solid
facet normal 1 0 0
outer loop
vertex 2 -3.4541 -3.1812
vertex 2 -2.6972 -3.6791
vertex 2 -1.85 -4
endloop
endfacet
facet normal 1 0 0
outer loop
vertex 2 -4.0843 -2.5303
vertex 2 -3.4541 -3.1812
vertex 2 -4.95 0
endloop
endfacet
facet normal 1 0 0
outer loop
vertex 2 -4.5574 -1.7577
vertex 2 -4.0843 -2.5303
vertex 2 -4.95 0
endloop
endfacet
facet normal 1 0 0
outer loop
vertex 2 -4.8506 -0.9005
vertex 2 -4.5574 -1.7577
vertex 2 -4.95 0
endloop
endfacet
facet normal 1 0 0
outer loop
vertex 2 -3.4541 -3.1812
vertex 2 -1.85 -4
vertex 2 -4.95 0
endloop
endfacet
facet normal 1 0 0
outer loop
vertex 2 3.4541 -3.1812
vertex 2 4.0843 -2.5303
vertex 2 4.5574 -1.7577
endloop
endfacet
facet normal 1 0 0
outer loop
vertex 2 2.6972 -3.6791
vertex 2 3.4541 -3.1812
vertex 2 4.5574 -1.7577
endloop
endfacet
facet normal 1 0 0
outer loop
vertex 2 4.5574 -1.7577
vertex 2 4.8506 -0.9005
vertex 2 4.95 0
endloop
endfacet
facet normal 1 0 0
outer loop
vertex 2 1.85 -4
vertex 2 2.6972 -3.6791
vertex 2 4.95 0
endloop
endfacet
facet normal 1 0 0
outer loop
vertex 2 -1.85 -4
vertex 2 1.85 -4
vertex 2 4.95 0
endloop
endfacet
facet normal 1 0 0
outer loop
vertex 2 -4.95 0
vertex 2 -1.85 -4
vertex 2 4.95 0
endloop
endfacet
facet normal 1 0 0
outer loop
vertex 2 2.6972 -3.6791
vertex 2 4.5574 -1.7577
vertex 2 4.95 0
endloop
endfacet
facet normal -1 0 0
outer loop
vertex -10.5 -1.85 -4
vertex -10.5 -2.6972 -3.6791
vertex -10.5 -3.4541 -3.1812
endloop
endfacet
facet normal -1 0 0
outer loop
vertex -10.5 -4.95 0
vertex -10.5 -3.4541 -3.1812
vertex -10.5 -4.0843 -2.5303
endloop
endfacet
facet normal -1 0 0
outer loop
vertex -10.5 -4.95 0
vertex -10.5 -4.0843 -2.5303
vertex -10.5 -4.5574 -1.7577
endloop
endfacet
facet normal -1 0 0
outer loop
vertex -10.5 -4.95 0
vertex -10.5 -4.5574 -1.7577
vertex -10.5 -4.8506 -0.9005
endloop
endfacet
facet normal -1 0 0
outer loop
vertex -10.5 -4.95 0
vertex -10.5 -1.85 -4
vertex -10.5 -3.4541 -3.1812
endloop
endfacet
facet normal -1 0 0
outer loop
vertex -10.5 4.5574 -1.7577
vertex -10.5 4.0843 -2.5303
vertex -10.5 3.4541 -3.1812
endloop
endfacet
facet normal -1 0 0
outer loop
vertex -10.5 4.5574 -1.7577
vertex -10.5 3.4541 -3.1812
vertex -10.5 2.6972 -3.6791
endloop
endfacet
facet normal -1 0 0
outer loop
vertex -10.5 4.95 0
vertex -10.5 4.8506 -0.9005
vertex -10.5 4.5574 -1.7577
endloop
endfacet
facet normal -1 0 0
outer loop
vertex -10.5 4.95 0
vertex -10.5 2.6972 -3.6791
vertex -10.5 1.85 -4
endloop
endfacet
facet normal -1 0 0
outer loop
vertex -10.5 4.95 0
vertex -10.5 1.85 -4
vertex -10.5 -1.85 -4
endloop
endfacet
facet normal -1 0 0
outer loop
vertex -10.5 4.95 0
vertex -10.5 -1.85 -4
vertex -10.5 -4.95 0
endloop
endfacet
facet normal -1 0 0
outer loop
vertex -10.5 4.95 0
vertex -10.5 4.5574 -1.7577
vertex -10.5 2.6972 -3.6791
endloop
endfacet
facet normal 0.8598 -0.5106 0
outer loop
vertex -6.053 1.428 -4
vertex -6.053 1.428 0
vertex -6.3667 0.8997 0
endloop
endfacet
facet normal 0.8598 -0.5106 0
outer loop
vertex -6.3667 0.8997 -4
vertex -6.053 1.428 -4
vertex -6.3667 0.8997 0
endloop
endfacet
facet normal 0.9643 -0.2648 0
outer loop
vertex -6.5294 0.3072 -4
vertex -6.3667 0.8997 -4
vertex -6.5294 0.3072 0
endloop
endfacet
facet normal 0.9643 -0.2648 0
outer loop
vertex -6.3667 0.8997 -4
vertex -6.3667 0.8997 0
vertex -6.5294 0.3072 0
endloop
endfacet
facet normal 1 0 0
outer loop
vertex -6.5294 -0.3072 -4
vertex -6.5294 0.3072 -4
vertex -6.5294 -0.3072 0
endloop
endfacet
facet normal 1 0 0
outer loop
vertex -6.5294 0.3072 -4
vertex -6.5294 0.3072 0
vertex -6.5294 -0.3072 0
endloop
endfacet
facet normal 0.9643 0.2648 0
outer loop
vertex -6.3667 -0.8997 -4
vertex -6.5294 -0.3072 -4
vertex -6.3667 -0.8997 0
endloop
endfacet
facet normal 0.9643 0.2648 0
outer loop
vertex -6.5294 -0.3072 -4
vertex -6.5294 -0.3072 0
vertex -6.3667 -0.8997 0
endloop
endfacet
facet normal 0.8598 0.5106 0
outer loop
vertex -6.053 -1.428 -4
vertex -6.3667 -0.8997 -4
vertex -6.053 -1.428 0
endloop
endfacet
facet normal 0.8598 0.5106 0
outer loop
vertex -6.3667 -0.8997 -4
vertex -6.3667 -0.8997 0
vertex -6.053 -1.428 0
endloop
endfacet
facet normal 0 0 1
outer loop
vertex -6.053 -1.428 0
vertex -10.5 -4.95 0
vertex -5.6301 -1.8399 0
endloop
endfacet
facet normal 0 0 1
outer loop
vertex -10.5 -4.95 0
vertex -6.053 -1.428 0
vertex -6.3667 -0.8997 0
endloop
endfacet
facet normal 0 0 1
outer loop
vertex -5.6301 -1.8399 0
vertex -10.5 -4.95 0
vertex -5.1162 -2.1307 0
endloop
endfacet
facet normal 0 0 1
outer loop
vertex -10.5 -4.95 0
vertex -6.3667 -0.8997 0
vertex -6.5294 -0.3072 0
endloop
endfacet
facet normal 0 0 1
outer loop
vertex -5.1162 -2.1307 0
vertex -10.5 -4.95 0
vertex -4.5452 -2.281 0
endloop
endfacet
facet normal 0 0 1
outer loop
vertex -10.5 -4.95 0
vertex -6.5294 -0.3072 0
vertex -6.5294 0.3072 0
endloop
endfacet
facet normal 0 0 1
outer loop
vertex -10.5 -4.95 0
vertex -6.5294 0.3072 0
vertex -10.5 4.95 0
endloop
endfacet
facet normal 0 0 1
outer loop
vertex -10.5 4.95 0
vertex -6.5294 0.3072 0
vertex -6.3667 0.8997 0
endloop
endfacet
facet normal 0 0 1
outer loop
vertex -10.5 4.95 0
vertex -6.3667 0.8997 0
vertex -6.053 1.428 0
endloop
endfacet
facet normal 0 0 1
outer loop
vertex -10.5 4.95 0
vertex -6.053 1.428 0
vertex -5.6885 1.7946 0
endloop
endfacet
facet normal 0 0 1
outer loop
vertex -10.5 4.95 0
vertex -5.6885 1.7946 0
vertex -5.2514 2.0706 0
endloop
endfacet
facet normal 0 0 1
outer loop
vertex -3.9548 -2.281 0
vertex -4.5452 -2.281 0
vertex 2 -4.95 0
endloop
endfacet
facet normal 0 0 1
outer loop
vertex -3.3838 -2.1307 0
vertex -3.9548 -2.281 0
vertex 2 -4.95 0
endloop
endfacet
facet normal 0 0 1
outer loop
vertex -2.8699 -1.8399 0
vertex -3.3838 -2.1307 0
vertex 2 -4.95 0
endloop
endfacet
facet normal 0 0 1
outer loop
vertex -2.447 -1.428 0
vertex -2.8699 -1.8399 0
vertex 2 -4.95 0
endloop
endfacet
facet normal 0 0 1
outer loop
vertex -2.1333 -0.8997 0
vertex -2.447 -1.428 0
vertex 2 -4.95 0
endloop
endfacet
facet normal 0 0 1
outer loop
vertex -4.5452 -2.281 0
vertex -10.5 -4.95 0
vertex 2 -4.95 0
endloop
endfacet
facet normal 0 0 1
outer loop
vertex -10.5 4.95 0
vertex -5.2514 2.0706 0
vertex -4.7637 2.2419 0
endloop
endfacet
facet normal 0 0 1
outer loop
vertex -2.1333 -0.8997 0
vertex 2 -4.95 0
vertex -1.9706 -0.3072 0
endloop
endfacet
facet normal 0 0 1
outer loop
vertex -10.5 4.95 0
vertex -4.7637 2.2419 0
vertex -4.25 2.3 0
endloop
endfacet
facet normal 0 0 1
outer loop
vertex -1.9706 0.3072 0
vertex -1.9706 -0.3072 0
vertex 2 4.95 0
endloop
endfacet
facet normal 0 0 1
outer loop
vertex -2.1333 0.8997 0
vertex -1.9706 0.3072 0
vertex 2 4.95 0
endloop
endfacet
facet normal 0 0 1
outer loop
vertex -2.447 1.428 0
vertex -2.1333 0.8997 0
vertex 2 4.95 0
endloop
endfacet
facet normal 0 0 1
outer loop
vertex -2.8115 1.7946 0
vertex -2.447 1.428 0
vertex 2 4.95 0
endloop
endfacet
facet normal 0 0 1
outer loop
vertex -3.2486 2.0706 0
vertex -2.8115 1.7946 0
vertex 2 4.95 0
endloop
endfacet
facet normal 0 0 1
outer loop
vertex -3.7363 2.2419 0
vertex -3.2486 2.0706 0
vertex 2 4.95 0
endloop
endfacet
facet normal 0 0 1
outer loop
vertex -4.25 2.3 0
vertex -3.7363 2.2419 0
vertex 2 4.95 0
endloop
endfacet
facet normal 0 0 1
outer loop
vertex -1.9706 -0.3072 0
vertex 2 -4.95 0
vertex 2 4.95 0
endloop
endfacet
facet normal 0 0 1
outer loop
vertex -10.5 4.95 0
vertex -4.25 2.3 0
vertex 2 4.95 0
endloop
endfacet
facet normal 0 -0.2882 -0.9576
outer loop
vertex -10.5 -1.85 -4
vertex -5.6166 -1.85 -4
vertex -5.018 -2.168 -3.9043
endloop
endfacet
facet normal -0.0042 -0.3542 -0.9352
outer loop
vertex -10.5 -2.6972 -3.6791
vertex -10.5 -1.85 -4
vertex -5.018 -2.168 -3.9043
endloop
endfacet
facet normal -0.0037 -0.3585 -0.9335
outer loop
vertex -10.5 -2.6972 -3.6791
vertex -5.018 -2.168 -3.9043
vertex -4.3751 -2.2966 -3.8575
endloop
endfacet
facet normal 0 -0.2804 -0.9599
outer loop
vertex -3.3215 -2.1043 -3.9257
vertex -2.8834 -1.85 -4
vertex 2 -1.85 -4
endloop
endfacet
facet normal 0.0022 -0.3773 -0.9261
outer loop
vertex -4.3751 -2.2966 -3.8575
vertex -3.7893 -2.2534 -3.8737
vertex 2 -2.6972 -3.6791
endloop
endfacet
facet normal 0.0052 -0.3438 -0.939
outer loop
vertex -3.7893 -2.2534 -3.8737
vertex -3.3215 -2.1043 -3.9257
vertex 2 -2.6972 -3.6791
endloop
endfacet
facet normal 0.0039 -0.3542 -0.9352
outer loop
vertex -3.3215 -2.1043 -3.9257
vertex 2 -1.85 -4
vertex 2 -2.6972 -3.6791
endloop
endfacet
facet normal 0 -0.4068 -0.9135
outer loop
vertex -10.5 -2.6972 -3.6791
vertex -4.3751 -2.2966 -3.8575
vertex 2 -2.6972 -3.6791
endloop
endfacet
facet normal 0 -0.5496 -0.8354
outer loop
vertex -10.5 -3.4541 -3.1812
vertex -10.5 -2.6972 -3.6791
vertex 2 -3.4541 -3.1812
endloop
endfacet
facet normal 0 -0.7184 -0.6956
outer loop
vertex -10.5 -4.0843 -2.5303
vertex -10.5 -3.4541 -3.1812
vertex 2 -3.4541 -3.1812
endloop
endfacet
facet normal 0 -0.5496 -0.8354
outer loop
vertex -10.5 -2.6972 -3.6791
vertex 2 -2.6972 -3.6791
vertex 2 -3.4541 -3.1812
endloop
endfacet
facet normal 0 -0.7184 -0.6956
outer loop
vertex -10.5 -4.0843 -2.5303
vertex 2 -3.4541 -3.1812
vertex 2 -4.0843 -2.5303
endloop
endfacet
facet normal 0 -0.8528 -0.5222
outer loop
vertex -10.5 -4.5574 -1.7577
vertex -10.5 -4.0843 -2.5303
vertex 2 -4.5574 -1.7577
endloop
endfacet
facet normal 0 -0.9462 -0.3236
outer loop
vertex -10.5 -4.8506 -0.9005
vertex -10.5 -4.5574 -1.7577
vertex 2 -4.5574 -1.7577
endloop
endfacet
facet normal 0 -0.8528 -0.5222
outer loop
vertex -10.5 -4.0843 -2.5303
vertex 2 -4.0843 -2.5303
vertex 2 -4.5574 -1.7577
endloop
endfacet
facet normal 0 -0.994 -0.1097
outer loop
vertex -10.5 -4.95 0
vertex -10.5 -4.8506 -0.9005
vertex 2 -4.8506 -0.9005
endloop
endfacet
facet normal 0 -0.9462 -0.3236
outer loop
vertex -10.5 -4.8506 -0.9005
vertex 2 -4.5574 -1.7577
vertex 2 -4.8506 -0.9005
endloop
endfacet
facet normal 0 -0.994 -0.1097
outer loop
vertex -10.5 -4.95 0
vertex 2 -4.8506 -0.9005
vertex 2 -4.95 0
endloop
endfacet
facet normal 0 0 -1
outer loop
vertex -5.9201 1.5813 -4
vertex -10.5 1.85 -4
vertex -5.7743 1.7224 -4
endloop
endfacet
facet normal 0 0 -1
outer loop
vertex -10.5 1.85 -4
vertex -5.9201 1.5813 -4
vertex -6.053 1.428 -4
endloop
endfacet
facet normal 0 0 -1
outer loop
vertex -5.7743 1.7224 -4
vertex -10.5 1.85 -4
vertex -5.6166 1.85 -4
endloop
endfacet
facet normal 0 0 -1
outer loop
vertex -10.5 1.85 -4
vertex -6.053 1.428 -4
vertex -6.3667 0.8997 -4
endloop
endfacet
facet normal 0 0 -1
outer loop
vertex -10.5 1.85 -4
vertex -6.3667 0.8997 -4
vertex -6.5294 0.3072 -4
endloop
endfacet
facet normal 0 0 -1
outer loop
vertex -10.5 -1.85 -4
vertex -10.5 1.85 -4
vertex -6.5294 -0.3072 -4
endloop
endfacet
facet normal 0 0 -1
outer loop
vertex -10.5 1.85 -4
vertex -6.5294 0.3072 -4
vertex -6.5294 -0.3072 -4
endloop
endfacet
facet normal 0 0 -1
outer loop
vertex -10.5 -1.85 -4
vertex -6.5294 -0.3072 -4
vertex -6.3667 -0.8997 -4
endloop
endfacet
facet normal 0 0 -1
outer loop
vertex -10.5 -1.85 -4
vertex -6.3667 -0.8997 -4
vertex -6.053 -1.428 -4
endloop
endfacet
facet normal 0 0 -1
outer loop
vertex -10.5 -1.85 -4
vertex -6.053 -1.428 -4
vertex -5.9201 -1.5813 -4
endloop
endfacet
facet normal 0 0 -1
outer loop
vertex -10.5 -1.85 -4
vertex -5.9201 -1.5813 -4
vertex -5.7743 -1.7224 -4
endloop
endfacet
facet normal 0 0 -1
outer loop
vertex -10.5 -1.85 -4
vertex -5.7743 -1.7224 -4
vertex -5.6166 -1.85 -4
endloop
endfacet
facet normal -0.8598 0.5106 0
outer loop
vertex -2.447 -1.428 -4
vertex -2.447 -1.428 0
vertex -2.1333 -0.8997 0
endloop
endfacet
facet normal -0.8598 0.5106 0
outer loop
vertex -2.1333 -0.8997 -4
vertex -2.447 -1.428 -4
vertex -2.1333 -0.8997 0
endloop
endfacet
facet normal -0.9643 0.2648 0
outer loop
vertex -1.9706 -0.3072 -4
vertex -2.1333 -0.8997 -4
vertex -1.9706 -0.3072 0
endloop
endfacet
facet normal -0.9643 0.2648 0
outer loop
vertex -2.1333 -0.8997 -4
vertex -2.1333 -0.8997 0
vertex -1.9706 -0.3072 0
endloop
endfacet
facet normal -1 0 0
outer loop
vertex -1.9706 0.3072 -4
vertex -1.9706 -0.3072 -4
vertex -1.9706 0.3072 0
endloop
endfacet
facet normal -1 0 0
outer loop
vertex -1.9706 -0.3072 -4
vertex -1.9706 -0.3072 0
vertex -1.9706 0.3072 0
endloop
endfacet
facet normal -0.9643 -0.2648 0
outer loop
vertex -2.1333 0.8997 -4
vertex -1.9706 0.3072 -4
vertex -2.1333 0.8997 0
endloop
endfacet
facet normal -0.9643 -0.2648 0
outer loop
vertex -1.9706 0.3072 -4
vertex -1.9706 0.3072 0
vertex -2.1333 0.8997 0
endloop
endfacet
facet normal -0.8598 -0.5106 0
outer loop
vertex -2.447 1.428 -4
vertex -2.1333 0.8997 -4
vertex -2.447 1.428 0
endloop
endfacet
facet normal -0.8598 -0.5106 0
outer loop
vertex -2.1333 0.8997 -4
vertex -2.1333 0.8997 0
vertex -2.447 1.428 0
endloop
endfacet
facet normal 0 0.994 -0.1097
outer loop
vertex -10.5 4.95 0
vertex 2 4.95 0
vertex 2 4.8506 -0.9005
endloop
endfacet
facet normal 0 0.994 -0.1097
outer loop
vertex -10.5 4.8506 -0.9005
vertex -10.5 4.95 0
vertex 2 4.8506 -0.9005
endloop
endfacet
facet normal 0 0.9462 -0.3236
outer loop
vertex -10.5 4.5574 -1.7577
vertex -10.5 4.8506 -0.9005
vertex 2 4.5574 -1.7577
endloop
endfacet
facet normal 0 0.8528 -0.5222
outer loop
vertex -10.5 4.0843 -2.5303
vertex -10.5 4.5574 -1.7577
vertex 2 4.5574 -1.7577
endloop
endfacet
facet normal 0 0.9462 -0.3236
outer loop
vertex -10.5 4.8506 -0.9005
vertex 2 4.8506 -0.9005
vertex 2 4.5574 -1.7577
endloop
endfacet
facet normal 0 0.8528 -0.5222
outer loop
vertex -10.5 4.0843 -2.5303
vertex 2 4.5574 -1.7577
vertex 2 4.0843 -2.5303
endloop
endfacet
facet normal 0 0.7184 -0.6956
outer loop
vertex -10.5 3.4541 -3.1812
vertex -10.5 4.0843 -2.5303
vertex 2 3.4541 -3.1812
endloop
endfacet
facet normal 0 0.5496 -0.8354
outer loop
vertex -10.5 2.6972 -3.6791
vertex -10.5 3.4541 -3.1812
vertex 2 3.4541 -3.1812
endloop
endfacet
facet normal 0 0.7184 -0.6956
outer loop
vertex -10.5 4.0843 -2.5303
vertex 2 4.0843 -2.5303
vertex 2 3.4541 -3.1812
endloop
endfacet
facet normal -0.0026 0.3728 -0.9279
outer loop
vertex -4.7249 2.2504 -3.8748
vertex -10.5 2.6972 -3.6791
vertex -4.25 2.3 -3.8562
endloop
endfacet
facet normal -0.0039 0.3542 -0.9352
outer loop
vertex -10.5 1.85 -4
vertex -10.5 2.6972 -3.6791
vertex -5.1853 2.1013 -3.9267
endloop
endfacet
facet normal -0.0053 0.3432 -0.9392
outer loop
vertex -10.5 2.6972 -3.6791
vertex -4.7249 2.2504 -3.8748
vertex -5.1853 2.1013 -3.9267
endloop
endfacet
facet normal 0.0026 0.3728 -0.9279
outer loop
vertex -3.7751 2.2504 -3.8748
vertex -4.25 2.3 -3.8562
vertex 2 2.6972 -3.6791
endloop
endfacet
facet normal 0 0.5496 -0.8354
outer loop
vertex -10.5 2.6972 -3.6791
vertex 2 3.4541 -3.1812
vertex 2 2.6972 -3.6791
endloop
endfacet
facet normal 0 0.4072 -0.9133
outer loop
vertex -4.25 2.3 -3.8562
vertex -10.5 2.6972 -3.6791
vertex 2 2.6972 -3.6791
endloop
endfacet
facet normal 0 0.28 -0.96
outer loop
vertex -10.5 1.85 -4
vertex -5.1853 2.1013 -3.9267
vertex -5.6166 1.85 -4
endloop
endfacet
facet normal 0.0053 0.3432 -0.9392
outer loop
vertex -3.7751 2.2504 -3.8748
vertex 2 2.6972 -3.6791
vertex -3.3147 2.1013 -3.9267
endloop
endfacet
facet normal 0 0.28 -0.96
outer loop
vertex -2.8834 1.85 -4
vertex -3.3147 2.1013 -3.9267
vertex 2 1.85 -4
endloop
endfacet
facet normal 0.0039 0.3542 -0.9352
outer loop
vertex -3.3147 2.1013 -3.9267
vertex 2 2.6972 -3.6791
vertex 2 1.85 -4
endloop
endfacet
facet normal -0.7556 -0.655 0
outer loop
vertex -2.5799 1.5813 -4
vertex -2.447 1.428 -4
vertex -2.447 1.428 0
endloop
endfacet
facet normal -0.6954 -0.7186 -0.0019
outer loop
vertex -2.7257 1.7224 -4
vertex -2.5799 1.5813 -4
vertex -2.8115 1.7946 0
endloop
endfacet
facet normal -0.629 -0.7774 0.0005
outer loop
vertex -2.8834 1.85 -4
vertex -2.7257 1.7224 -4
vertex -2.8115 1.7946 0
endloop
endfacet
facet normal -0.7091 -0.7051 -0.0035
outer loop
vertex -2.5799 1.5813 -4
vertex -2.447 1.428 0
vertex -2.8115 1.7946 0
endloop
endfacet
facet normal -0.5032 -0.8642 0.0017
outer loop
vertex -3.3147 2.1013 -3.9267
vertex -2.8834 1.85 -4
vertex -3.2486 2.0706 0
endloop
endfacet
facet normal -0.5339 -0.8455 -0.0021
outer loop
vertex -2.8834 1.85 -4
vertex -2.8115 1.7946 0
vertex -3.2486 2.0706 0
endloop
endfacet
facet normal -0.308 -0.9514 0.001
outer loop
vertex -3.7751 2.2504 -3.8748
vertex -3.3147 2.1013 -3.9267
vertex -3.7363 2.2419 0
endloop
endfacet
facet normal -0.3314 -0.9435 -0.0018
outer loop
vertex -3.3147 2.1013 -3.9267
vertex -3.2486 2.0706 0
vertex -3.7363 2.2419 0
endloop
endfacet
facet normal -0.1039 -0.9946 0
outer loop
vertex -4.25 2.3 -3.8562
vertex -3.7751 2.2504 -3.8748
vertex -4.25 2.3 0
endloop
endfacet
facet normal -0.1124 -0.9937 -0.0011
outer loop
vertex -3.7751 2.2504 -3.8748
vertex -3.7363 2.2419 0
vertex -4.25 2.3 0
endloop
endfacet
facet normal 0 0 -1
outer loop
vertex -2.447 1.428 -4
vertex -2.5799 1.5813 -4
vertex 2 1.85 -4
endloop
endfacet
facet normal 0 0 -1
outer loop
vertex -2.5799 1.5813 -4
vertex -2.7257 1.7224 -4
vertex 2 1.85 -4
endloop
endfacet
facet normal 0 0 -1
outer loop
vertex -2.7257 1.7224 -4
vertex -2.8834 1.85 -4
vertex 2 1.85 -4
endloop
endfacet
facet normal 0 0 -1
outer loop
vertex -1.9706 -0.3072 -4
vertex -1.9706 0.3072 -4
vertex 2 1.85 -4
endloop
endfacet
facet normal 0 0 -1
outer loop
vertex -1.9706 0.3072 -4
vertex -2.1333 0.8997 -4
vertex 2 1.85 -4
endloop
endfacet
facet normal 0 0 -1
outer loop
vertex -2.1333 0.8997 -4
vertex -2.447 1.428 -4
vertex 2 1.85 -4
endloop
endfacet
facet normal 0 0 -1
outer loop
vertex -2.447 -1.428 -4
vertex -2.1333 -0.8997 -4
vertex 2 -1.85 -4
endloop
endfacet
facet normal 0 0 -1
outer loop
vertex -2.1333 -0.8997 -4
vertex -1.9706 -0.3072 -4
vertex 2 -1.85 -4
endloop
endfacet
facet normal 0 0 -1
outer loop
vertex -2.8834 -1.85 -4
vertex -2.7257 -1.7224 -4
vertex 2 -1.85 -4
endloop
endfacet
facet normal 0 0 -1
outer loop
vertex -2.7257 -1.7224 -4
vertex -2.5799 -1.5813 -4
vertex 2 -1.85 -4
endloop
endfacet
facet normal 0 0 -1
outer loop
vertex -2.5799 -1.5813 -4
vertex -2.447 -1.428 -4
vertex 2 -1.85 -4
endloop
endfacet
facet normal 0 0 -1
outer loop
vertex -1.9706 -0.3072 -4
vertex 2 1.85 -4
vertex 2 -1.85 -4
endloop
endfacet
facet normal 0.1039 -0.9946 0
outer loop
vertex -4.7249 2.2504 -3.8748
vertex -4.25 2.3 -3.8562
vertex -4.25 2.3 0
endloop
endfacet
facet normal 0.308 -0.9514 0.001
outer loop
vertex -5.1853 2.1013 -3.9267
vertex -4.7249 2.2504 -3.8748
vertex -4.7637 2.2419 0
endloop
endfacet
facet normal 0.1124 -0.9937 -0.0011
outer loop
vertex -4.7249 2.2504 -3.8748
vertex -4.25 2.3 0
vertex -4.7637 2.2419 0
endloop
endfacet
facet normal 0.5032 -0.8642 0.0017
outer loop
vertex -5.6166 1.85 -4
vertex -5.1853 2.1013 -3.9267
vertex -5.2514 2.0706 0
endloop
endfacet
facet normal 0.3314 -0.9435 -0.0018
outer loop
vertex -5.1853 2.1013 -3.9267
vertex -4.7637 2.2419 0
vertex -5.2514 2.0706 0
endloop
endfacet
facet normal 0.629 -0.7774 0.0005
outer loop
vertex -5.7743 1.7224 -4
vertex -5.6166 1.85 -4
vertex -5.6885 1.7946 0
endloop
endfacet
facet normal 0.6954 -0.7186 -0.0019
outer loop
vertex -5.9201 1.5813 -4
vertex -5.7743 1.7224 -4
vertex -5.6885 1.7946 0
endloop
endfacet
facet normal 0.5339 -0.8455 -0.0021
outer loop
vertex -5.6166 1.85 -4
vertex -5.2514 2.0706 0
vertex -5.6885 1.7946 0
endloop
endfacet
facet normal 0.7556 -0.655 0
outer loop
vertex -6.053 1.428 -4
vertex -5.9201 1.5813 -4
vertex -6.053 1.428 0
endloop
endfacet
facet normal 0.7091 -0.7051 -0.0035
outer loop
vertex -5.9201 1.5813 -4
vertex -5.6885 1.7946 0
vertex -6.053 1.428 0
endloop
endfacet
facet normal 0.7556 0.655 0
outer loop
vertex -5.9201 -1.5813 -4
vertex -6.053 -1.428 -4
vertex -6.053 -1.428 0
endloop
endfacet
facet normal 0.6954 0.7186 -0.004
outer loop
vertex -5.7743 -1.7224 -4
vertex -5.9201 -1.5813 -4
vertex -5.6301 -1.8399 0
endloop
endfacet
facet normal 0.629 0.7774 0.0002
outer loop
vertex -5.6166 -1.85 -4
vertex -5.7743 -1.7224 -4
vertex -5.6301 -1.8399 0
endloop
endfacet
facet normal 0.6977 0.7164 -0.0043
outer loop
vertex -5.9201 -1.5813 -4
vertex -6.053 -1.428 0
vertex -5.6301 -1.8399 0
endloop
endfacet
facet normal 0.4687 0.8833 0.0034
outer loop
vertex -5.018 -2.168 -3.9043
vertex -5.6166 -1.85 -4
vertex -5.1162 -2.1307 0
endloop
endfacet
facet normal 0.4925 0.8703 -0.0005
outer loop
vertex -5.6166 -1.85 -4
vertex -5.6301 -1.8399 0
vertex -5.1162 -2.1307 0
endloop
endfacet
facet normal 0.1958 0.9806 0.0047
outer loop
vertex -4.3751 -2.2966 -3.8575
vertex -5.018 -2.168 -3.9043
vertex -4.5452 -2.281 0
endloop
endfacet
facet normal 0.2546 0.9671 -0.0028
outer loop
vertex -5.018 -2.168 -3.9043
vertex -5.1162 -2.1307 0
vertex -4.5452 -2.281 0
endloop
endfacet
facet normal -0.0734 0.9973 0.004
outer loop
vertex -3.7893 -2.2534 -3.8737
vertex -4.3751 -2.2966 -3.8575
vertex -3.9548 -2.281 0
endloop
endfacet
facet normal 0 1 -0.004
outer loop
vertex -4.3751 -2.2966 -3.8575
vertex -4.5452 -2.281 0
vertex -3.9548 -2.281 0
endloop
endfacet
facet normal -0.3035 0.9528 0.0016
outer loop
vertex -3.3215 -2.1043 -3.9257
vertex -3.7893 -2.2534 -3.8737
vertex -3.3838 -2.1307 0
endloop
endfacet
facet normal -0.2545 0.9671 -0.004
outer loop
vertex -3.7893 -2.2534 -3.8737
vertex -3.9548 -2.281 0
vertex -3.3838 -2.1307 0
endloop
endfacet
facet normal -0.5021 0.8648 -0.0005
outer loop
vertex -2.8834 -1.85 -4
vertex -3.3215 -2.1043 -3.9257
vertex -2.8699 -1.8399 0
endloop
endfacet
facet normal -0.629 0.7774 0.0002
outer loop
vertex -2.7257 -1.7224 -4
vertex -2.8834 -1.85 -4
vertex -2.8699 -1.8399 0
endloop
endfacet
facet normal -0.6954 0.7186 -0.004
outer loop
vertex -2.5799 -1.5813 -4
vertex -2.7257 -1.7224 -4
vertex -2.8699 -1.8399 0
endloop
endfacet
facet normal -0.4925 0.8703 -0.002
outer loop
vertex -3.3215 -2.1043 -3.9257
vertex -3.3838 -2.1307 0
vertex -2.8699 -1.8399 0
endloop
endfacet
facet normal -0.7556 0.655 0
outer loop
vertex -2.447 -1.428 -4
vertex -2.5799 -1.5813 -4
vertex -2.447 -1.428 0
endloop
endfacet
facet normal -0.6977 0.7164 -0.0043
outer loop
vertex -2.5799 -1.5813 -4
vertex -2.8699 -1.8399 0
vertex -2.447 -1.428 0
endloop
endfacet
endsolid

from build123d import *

# Parameters (mm, degrees)
F1_DEPTH = 12.5
F3_DEPTH = 4
F4_ANGLE = 90


with BuildPart() as f1:
    # F0 (on Top) → F1 (new body)
    with BuildSketch(Plane.XY):
        with BuildLine():
            Line((2, -4.95), (2, 4.95))
            ThreePointArc((2, 4.95), (-0.5303161858, 4.0842789494), (-2, 1.85))
            Line((-2, 1.85), (-2, -1.85))
            ThreePointArc((-2, -1.85), (-0.5303161858, -4.0842789494), (2, -4.95))
        make_face()
    extrude(amount=F1_DEPTH)

    # F2 (on face) → F3 (cut)
    with BuildSketch(Plane.YZ.offset(2)):
        with BuildLine():
            Line((0, 6.25), (-1.4279861962, 4.4469871261))
            ThreePointArc((-1.4279861962, 4.4469871261), (0, 3.95), (1.4279861962, 4.4469871261))
            Line((1.4279861962, 4.4469871261), (0, 6.25))
        make_face()
        with BuildLine():
            Line((1.4279861962, 8.0530128739), (0, 6.25))
            Line((0, 6.25), (1.4279861962, 4.4469871261))
            ThreePointArc((1.4279861962, 4.4469871261), (2.0705516476, 5.2485930525), (2.3, 6.25))
            ThreePointArc((2.3, 6.25), (2.0705516476, 7.2514069475), (1.4279861962, 8.0530128739))
        make_face()
        with BuildLine():
            Line((-1.4279861962, 8.0530128739), (0, 6.25))
            Line((0, 6.25), (1.4279861962, 8.0530128739))
            ThreePointArc((1.4279861962, 8.0530128739), (0, 8.55), (-1.4279861962, 8.0530128739))
        make_face()
        with BuildLine():
            ThreePointArc((-1.4279861962, 8.0530128739), (-2.3, 6.25), (-1.4279861962, 4.4469871261))
            Line((-1.4279861962, 4.4469871261), (0, 6.25))
            Line((0, 6.25), (-1.4279861962, 8.0530128739))
        make_face()
    extrude(amount=-F3_DEPTH, mode=Mode.SUBTRACT)


with BuildPart() as f1_1:
    # F4: moved
    add(f1.part.rotate(Axis((2, 0, 0), (0, -1, 0)), F4_ANGLE))


solid = f1_1.part
